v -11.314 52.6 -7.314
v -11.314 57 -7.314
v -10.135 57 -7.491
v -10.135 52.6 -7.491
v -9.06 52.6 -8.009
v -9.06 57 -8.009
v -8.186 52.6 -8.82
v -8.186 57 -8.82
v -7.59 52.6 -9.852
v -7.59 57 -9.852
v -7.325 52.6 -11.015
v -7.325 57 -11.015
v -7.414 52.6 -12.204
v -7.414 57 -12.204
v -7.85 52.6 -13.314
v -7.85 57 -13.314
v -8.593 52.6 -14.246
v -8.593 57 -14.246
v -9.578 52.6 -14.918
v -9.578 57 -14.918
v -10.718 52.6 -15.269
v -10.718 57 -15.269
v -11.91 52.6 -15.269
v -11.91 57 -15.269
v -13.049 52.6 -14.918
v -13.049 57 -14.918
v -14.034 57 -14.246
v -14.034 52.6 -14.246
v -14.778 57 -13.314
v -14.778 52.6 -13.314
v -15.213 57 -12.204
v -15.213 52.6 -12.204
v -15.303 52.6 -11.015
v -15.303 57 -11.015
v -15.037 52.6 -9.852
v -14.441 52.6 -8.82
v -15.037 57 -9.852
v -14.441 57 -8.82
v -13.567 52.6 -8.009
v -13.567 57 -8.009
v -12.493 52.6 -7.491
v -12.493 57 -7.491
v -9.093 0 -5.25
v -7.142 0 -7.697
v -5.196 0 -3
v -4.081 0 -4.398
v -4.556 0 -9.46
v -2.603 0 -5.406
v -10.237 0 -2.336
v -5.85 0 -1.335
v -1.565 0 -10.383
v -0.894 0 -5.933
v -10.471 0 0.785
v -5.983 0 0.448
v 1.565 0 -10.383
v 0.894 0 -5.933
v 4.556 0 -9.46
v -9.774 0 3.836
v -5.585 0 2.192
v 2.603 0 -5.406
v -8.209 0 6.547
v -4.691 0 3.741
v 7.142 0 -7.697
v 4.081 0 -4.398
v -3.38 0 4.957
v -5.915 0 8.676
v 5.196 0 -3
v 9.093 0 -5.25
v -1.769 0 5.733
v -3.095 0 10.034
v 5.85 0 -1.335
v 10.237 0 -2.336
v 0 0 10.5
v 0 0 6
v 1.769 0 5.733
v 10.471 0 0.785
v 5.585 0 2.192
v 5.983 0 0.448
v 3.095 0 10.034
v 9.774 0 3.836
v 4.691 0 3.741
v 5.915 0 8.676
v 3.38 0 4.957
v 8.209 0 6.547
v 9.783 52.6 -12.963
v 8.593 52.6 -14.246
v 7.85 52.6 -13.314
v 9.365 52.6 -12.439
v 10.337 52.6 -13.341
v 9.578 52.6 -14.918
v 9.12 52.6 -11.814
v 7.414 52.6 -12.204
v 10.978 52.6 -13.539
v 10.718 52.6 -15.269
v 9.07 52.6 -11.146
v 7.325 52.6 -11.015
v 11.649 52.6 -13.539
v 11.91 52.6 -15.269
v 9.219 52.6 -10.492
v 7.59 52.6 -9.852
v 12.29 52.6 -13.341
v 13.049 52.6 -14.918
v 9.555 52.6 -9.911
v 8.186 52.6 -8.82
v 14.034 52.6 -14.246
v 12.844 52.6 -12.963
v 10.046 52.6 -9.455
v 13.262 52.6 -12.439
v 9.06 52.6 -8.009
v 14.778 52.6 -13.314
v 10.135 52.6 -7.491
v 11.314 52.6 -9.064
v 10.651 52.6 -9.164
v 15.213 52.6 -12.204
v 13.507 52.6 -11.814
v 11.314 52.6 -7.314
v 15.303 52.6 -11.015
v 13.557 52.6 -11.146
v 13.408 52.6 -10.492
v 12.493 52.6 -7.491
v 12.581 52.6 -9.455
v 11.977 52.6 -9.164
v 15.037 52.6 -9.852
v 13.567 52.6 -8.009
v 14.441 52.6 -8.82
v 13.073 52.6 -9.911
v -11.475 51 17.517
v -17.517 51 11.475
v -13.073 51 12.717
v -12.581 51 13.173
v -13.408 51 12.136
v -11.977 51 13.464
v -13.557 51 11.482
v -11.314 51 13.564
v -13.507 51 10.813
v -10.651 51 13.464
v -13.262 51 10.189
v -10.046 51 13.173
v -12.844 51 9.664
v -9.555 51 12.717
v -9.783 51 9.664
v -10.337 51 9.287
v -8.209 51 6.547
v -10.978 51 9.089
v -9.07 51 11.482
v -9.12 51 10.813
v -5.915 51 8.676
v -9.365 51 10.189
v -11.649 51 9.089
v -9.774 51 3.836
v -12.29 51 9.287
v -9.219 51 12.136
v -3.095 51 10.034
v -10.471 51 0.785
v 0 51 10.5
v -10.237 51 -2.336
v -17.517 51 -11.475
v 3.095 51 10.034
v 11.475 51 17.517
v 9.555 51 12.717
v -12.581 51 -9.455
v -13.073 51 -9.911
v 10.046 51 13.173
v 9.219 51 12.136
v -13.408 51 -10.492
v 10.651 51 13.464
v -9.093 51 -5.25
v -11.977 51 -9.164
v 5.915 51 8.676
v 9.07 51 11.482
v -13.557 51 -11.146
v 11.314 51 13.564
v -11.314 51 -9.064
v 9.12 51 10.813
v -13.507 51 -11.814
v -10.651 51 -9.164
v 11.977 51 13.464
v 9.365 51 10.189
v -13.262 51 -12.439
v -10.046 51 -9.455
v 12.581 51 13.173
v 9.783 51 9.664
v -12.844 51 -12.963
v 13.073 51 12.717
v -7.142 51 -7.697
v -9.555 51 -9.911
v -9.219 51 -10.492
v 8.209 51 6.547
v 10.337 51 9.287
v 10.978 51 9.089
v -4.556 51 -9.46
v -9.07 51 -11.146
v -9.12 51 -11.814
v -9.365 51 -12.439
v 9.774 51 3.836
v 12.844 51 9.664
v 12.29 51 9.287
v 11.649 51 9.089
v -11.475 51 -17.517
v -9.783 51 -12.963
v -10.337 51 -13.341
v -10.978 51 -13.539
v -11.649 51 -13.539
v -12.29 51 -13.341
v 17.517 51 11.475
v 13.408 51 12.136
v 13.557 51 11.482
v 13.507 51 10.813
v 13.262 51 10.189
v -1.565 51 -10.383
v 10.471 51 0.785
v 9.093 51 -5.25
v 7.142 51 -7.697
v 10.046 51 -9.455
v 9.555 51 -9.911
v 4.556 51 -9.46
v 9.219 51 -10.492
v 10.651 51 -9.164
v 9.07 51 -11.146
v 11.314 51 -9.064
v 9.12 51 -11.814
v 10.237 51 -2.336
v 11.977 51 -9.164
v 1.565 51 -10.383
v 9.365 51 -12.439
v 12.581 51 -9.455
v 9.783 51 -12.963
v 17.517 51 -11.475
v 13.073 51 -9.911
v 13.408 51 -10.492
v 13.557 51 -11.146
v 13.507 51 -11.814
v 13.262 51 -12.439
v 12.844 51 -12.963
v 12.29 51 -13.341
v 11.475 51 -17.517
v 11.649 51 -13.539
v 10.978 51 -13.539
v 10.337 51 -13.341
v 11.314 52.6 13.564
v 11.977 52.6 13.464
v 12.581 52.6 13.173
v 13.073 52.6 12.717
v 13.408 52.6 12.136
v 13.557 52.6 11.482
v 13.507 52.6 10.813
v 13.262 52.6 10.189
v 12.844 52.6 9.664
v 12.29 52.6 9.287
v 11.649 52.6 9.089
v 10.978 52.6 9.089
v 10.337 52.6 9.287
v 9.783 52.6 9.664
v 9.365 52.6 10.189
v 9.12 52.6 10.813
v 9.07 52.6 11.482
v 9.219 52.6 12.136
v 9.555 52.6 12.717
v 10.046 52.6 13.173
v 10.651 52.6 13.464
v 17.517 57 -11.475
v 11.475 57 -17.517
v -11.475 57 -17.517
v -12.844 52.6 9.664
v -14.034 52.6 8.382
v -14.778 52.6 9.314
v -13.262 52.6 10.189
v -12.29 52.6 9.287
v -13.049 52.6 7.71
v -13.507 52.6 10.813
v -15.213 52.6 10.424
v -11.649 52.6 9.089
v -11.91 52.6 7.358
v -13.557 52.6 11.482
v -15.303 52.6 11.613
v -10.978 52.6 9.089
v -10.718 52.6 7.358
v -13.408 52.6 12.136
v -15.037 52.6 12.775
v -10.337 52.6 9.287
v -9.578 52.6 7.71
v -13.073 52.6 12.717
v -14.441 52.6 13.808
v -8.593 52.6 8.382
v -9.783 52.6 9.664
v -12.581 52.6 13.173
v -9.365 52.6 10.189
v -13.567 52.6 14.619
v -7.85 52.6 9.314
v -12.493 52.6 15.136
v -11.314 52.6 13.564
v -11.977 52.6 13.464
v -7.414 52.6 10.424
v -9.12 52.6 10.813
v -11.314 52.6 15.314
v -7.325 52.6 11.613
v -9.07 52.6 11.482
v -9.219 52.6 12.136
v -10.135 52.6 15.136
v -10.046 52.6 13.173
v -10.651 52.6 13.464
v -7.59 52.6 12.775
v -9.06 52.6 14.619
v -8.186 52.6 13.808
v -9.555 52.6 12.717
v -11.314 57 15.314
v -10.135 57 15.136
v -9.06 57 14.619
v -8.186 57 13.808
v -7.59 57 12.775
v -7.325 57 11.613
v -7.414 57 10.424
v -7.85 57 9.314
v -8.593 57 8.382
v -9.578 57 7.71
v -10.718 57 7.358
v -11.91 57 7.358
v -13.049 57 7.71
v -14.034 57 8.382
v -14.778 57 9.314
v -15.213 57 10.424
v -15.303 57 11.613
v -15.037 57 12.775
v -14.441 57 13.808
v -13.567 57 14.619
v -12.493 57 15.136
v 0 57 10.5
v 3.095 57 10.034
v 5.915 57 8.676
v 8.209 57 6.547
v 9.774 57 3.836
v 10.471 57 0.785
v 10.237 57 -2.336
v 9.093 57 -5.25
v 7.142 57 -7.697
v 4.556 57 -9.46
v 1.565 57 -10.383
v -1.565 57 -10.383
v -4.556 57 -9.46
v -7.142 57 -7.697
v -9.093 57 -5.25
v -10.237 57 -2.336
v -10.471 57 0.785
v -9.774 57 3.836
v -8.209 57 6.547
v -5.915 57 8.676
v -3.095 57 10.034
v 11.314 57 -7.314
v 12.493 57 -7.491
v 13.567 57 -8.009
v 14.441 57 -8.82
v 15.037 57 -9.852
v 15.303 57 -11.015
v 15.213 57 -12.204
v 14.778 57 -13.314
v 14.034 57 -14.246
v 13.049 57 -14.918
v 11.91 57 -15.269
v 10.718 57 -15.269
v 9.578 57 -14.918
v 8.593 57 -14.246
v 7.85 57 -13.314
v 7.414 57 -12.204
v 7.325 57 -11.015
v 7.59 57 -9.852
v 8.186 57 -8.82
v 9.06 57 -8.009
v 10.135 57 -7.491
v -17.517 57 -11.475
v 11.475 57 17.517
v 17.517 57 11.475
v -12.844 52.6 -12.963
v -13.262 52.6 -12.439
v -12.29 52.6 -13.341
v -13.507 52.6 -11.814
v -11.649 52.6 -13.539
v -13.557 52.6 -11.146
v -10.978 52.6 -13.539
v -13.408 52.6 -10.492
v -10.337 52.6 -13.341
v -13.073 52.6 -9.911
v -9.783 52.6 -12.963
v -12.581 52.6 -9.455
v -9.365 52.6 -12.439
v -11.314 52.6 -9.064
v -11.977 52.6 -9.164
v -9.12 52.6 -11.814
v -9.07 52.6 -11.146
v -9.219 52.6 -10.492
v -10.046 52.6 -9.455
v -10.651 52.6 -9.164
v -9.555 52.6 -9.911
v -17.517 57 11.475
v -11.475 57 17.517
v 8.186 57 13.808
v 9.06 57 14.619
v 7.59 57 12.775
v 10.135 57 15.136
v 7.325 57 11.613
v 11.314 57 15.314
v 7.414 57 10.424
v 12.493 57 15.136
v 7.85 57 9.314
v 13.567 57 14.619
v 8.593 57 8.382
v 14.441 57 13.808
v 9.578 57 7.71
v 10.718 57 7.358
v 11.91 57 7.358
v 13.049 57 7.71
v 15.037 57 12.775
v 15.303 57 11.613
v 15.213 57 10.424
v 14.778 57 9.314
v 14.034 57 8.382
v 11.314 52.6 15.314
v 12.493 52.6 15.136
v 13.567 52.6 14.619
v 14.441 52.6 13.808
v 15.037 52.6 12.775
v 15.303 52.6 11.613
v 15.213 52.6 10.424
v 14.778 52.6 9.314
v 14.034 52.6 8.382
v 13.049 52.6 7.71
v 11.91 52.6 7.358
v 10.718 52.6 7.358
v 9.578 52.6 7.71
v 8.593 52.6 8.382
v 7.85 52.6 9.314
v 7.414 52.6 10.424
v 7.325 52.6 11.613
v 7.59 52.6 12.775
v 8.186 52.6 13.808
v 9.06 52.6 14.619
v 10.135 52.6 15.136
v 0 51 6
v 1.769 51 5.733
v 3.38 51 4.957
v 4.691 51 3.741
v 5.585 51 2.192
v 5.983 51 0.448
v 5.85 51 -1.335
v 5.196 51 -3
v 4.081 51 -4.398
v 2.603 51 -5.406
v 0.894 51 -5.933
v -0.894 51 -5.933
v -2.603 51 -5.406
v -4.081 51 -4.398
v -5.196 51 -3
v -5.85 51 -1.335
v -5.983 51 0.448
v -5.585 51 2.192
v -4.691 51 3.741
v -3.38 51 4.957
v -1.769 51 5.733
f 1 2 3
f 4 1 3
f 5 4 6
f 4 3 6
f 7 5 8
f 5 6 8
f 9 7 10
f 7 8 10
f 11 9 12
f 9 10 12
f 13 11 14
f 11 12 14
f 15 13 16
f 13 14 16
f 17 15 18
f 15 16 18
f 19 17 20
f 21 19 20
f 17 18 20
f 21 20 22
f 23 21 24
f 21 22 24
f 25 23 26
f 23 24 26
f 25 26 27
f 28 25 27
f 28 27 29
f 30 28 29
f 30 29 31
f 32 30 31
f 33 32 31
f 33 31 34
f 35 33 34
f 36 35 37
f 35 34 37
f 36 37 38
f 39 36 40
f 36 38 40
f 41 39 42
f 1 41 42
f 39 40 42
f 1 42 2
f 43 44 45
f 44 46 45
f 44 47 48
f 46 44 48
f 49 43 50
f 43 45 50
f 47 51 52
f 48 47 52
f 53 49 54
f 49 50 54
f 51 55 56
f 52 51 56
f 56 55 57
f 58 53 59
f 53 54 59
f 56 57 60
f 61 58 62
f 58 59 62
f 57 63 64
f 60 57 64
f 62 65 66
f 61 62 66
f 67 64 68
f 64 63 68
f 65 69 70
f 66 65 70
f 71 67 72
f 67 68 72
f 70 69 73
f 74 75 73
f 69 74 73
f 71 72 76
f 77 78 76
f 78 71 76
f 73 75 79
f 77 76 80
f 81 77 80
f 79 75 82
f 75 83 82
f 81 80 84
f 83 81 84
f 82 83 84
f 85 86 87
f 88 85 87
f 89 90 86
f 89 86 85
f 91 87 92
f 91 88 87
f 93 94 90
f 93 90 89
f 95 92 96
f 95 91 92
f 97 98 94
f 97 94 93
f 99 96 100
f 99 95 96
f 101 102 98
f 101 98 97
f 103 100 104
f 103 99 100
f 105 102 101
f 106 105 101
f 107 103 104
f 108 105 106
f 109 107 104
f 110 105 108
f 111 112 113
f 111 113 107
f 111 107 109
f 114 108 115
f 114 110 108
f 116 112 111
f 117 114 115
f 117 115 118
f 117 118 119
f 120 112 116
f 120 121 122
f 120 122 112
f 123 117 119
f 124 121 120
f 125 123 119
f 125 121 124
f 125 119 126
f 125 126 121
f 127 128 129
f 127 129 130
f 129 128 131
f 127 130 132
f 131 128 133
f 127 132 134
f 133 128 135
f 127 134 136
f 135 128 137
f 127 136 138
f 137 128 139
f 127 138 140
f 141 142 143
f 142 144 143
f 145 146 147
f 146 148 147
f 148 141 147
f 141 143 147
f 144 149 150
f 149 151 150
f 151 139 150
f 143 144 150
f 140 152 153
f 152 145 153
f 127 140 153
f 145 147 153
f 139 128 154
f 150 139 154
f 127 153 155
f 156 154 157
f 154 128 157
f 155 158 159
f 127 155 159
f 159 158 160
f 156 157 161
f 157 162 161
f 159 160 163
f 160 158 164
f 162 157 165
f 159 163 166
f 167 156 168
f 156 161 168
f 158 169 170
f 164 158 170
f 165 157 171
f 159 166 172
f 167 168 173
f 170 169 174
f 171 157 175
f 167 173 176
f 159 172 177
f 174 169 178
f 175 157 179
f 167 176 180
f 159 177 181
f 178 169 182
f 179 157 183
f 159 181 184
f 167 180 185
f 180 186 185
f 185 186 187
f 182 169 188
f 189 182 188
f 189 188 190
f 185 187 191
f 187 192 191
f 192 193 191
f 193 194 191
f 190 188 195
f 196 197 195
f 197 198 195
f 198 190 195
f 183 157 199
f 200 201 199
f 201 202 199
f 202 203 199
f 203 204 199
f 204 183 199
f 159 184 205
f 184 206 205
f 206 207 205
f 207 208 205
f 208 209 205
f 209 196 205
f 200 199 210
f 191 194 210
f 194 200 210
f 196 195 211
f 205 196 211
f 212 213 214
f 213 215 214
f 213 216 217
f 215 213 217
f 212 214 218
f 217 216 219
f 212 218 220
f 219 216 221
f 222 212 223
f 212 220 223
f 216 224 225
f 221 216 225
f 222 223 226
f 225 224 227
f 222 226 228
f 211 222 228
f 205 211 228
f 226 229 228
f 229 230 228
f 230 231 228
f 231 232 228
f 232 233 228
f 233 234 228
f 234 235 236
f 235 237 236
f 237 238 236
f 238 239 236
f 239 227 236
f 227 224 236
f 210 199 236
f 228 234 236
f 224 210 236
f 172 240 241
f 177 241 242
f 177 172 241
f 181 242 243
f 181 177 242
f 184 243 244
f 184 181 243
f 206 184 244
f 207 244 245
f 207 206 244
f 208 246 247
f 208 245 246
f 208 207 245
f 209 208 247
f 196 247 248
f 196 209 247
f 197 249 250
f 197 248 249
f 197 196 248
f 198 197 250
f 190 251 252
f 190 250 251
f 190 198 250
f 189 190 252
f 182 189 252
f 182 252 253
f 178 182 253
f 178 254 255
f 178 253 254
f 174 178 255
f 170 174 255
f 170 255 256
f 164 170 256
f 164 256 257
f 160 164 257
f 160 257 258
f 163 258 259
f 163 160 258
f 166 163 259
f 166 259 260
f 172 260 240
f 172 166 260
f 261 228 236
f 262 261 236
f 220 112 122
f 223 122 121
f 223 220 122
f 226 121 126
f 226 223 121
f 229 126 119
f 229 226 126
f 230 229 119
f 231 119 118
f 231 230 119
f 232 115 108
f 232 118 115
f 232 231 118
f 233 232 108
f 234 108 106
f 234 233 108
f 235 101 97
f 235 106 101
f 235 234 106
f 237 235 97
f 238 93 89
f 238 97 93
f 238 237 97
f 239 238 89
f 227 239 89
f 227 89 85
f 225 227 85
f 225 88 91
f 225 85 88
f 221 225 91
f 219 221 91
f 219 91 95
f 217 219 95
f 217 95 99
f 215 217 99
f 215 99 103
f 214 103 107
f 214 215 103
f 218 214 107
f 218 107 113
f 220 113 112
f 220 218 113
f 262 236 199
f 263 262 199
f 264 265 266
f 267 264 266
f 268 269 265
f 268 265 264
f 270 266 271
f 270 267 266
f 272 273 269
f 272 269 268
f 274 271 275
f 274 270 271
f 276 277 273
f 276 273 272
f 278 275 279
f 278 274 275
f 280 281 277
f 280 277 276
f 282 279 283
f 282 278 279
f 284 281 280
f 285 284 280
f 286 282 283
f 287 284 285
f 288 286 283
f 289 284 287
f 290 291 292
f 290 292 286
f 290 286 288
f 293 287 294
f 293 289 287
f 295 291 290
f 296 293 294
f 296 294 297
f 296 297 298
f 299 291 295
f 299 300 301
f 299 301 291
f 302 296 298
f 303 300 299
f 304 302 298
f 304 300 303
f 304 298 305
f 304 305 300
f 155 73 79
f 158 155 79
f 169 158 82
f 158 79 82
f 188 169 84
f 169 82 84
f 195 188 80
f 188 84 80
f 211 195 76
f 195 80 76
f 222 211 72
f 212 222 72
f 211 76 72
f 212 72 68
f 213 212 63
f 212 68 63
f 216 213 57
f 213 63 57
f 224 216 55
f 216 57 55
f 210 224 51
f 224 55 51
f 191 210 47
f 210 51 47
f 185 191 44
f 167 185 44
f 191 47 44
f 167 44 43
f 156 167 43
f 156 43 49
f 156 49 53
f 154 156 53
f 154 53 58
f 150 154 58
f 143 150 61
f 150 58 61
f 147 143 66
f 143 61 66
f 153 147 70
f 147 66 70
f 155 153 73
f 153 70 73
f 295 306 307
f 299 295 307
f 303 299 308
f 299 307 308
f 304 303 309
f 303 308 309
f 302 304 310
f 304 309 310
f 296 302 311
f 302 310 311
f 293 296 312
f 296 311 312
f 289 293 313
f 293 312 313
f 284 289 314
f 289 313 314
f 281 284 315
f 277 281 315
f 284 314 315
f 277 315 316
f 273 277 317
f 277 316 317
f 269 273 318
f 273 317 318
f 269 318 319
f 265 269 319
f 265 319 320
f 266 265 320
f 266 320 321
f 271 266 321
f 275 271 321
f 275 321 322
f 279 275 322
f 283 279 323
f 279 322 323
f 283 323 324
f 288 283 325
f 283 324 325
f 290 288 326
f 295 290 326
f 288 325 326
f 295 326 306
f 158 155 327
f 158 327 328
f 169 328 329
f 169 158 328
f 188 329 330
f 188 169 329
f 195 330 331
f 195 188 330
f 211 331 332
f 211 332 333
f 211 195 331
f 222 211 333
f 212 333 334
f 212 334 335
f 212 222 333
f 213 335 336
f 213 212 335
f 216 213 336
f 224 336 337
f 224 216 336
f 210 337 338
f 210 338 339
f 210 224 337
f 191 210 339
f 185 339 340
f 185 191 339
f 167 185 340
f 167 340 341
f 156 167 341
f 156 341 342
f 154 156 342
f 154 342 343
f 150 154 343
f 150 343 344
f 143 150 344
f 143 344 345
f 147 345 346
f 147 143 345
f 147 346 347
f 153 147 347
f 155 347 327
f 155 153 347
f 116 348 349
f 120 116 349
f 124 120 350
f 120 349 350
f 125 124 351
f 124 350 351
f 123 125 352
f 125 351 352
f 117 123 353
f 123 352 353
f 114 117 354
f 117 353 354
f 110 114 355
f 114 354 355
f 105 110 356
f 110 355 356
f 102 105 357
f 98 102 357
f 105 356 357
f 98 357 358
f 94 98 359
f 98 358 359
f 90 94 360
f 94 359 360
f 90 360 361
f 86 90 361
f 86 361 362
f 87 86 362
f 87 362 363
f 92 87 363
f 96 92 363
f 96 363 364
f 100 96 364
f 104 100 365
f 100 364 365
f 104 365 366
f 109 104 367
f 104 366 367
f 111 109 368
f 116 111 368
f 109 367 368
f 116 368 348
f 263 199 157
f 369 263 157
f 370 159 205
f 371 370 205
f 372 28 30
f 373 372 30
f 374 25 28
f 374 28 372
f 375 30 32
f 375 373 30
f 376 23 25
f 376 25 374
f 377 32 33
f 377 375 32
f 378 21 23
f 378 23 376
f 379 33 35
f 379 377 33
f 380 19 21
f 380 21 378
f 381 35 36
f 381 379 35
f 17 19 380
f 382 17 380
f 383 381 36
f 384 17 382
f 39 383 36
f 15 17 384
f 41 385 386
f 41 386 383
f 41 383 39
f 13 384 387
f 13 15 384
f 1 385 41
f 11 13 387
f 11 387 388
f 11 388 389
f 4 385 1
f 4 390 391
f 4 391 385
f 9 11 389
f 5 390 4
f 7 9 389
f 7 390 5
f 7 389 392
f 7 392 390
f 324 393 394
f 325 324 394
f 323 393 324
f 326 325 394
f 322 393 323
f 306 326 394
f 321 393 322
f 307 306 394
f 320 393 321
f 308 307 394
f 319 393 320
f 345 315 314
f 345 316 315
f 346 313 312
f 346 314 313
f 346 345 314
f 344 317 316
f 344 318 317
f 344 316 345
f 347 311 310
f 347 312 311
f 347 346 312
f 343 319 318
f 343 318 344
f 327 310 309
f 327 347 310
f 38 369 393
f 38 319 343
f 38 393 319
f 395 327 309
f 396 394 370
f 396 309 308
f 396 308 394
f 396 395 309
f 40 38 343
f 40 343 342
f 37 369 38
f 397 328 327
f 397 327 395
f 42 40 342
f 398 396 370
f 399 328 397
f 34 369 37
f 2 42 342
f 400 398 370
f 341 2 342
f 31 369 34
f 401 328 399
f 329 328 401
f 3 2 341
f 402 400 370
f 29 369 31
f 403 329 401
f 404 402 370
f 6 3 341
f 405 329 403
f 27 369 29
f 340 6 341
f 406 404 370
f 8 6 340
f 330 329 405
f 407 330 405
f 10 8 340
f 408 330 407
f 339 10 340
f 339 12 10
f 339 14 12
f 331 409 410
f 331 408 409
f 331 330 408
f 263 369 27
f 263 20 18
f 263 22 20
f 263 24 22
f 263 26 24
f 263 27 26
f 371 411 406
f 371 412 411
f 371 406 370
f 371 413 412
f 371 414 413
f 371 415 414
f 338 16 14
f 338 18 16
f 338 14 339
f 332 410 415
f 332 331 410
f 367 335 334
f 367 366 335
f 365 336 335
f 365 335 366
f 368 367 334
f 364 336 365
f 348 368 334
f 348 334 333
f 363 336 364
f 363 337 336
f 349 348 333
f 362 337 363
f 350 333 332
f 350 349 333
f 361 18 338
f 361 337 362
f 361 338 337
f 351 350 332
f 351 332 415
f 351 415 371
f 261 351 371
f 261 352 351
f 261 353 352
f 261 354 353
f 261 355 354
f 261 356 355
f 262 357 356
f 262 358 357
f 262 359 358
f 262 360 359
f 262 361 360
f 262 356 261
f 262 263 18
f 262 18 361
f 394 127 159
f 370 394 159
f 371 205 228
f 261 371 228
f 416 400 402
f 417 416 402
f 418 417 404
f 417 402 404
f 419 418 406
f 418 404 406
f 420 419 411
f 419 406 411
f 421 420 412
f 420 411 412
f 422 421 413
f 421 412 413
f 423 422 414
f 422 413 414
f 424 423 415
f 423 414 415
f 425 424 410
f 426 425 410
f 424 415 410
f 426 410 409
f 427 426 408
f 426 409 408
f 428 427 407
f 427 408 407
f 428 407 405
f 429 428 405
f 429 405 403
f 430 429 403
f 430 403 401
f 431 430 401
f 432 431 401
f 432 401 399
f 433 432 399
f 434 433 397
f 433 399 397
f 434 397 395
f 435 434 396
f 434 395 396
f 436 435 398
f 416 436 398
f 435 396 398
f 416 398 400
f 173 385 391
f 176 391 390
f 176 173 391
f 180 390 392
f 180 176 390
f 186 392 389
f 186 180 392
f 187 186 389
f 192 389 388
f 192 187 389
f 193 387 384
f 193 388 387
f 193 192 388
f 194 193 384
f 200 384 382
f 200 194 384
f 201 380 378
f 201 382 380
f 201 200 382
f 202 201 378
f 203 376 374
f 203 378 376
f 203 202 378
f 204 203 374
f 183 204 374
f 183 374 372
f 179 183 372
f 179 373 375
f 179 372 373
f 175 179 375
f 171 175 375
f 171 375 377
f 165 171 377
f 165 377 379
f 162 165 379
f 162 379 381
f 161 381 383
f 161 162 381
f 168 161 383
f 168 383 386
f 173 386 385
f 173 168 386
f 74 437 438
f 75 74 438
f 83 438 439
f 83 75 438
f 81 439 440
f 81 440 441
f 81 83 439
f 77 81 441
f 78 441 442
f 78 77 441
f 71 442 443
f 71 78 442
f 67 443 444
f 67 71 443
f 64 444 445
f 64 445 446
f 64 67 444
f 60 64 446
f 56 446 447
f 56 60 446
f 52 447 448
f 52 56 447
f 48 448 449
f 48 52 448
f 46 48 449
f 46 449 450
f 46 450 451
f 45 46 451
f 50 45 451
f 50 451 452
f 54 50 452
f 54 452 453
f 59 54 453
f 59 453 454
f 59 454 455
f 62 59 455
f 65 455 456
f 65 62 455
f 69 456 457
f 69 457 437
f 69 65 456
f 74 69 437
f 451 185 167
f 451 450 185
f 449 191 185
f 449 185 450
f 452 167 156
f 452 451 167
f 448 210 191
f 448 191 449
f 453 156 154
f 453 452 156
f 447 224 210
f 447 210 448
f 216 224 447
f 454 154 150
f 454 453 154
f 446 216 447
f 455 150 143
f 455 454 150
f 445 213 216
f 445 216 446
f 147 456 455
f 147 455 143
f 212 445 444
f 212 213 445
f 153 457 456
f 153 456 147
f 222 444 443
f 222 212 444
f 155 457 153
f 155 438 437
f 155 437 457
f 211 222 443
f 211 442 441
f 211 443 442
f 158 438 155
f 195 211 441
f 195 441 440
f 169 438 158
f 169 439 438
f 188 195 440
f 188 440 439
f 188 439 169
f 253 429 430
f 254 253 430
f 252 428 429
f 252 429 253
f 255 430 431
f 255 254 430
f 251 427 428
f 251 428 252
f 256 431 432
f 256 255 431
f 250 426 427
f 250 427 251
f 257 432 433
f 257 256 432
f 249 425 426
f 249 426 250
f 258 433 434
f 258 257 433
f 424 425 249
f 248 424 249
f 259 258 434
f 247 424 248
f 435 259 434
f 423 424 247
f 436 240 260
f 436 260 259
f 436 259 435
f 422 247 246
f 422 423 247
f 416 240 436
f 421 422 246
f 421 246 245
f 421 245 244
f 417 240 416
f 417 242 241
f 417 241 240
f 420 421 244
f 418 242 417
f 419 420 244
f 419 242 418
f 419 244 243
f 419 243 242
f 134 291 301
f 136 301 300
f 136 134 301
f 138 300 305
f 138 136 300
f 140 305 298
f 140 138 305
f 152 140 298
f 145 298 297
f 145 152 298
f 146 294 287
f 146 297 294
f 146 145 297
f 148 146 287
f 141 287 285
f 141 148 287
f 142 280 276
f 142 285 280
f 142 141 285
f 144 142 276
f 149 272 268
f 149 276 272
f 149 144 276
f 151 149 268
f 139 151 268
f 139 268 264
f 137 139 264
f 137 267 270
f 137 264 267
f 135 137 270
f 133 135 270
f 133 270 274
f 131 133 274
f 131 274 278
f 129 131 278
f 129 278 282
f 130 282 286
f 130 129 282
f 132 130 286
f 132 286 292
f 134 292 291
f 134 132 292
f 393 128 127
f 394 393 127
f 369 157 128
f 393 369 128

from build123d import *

# Parameters (mm, degrees)
SKETCH1_R           = 10.5
SKETCH1_R_2         = 6
BOSS_EXTRUDE1_DEPTH = 51
SKETCH2_R           = 2.25
SKETCH2_R_2         = 10.5
BOSS_EXTRUDE2_DEPTH = 6
SKETCH3_R           = 4
CUT_EXTRUDE1_DEPTH  = 4.4


with BuildPart() as part:
    # Sketch1 → Boss-Extrude1 (new body)
    with BuildSketch(Plane(origin=(0, 0, 0), x_dir=(1, 0, 0), z_dir=(0, 1, 0))):
        with Locations(Location((0, 0, 0), (0, 0, 270))):
            Circle(SKETCH1_R)
        with Locations(Location((0, 0, 0), (0, 0, 270))):
            Circle(SKETCH1_R_2, mode=Mode.SUBTRACT)
    extrude(amount=BOSS_EXTRUDE1_DEPTH)


with BuildPart() as body_2:
    # Sketch2 → Boss-Extrude2 (new body)
    with BuildSketch(Plane(origin=(0, 51, 0), x_dir=(1, 0, 0), z_dir=(0, 1, 0))):
        Polygon((-17.516545186, 11.474832843), (-17.516545186, -11.474832843), (-11.474832843, -17.516545186), (11.474832843, -17.516545186), (17.516545186, -11.474832843), (17.516545186, 11.474832843), (11.474832843, 17.516545186), (-11.474832843, 17.516545186), align=None)
        with Locations(Location((11.313708499, 11.313708499, 0), (0, 0, 270))):
            Circle(SKETCH2_R, mode=Mode.SUBTRACT)
        with Locations(Location((-11.313708499, 11.313708499, 0), (0, 0, 270))):
            Circle(SKETCH2_R, mode=Mode.SUBTRACT)
        with Locations(Location((-11.313708499, -11.313708499, 0), (0, 0, 270))):
            Circle(SKETCH2_R, mode=Mode.SUBTRACT)
        with Locations(Location((11.313708499, -11.313708499, 0), (0, 0, 270))):
            Circle(SKETCH2_R, mode=Mode.SUBTRACT)
        with Locations(Location((0, 0, 0), (0, 0, 270))):
            Circle(SKETCH2_R_2, mode=Mode.SUBTRACT)
    extrude(amount=BOSS_EXTRUDE2_DEPTH)

    # Sketch3 → Cut-Extrude1 (cut)
    with BuildSketch(Plane(origin=(0, 57, 0), x_dir=(1, 0, 0), z_dir=(0, 1, 0))):
        with Locations(Location((-11.313708499, 11.313708499, 0), (0, 0, 270))):
            Circle(SKETCH3_R)
        with Locations(Location((-11.313708499, -11.313708499, 0), (0, 0, 270))):
            Circle(SKETCH3_R)
        with Locations(Location((11.313708499, -11.313708499, 0), (0, 0, 270))):
            Circle(SKETCH3_R)
        with Locations(Location((11.313708499, 11.313708499, 0), (0, 0, 270))):
            Circle(SKETCH3_R)
    extrude(amount=-CUT_EXTRUDE1_DEPTH, mode=Mode.SUBTRACT)


solid = Compound([part.part, body_2.part])
